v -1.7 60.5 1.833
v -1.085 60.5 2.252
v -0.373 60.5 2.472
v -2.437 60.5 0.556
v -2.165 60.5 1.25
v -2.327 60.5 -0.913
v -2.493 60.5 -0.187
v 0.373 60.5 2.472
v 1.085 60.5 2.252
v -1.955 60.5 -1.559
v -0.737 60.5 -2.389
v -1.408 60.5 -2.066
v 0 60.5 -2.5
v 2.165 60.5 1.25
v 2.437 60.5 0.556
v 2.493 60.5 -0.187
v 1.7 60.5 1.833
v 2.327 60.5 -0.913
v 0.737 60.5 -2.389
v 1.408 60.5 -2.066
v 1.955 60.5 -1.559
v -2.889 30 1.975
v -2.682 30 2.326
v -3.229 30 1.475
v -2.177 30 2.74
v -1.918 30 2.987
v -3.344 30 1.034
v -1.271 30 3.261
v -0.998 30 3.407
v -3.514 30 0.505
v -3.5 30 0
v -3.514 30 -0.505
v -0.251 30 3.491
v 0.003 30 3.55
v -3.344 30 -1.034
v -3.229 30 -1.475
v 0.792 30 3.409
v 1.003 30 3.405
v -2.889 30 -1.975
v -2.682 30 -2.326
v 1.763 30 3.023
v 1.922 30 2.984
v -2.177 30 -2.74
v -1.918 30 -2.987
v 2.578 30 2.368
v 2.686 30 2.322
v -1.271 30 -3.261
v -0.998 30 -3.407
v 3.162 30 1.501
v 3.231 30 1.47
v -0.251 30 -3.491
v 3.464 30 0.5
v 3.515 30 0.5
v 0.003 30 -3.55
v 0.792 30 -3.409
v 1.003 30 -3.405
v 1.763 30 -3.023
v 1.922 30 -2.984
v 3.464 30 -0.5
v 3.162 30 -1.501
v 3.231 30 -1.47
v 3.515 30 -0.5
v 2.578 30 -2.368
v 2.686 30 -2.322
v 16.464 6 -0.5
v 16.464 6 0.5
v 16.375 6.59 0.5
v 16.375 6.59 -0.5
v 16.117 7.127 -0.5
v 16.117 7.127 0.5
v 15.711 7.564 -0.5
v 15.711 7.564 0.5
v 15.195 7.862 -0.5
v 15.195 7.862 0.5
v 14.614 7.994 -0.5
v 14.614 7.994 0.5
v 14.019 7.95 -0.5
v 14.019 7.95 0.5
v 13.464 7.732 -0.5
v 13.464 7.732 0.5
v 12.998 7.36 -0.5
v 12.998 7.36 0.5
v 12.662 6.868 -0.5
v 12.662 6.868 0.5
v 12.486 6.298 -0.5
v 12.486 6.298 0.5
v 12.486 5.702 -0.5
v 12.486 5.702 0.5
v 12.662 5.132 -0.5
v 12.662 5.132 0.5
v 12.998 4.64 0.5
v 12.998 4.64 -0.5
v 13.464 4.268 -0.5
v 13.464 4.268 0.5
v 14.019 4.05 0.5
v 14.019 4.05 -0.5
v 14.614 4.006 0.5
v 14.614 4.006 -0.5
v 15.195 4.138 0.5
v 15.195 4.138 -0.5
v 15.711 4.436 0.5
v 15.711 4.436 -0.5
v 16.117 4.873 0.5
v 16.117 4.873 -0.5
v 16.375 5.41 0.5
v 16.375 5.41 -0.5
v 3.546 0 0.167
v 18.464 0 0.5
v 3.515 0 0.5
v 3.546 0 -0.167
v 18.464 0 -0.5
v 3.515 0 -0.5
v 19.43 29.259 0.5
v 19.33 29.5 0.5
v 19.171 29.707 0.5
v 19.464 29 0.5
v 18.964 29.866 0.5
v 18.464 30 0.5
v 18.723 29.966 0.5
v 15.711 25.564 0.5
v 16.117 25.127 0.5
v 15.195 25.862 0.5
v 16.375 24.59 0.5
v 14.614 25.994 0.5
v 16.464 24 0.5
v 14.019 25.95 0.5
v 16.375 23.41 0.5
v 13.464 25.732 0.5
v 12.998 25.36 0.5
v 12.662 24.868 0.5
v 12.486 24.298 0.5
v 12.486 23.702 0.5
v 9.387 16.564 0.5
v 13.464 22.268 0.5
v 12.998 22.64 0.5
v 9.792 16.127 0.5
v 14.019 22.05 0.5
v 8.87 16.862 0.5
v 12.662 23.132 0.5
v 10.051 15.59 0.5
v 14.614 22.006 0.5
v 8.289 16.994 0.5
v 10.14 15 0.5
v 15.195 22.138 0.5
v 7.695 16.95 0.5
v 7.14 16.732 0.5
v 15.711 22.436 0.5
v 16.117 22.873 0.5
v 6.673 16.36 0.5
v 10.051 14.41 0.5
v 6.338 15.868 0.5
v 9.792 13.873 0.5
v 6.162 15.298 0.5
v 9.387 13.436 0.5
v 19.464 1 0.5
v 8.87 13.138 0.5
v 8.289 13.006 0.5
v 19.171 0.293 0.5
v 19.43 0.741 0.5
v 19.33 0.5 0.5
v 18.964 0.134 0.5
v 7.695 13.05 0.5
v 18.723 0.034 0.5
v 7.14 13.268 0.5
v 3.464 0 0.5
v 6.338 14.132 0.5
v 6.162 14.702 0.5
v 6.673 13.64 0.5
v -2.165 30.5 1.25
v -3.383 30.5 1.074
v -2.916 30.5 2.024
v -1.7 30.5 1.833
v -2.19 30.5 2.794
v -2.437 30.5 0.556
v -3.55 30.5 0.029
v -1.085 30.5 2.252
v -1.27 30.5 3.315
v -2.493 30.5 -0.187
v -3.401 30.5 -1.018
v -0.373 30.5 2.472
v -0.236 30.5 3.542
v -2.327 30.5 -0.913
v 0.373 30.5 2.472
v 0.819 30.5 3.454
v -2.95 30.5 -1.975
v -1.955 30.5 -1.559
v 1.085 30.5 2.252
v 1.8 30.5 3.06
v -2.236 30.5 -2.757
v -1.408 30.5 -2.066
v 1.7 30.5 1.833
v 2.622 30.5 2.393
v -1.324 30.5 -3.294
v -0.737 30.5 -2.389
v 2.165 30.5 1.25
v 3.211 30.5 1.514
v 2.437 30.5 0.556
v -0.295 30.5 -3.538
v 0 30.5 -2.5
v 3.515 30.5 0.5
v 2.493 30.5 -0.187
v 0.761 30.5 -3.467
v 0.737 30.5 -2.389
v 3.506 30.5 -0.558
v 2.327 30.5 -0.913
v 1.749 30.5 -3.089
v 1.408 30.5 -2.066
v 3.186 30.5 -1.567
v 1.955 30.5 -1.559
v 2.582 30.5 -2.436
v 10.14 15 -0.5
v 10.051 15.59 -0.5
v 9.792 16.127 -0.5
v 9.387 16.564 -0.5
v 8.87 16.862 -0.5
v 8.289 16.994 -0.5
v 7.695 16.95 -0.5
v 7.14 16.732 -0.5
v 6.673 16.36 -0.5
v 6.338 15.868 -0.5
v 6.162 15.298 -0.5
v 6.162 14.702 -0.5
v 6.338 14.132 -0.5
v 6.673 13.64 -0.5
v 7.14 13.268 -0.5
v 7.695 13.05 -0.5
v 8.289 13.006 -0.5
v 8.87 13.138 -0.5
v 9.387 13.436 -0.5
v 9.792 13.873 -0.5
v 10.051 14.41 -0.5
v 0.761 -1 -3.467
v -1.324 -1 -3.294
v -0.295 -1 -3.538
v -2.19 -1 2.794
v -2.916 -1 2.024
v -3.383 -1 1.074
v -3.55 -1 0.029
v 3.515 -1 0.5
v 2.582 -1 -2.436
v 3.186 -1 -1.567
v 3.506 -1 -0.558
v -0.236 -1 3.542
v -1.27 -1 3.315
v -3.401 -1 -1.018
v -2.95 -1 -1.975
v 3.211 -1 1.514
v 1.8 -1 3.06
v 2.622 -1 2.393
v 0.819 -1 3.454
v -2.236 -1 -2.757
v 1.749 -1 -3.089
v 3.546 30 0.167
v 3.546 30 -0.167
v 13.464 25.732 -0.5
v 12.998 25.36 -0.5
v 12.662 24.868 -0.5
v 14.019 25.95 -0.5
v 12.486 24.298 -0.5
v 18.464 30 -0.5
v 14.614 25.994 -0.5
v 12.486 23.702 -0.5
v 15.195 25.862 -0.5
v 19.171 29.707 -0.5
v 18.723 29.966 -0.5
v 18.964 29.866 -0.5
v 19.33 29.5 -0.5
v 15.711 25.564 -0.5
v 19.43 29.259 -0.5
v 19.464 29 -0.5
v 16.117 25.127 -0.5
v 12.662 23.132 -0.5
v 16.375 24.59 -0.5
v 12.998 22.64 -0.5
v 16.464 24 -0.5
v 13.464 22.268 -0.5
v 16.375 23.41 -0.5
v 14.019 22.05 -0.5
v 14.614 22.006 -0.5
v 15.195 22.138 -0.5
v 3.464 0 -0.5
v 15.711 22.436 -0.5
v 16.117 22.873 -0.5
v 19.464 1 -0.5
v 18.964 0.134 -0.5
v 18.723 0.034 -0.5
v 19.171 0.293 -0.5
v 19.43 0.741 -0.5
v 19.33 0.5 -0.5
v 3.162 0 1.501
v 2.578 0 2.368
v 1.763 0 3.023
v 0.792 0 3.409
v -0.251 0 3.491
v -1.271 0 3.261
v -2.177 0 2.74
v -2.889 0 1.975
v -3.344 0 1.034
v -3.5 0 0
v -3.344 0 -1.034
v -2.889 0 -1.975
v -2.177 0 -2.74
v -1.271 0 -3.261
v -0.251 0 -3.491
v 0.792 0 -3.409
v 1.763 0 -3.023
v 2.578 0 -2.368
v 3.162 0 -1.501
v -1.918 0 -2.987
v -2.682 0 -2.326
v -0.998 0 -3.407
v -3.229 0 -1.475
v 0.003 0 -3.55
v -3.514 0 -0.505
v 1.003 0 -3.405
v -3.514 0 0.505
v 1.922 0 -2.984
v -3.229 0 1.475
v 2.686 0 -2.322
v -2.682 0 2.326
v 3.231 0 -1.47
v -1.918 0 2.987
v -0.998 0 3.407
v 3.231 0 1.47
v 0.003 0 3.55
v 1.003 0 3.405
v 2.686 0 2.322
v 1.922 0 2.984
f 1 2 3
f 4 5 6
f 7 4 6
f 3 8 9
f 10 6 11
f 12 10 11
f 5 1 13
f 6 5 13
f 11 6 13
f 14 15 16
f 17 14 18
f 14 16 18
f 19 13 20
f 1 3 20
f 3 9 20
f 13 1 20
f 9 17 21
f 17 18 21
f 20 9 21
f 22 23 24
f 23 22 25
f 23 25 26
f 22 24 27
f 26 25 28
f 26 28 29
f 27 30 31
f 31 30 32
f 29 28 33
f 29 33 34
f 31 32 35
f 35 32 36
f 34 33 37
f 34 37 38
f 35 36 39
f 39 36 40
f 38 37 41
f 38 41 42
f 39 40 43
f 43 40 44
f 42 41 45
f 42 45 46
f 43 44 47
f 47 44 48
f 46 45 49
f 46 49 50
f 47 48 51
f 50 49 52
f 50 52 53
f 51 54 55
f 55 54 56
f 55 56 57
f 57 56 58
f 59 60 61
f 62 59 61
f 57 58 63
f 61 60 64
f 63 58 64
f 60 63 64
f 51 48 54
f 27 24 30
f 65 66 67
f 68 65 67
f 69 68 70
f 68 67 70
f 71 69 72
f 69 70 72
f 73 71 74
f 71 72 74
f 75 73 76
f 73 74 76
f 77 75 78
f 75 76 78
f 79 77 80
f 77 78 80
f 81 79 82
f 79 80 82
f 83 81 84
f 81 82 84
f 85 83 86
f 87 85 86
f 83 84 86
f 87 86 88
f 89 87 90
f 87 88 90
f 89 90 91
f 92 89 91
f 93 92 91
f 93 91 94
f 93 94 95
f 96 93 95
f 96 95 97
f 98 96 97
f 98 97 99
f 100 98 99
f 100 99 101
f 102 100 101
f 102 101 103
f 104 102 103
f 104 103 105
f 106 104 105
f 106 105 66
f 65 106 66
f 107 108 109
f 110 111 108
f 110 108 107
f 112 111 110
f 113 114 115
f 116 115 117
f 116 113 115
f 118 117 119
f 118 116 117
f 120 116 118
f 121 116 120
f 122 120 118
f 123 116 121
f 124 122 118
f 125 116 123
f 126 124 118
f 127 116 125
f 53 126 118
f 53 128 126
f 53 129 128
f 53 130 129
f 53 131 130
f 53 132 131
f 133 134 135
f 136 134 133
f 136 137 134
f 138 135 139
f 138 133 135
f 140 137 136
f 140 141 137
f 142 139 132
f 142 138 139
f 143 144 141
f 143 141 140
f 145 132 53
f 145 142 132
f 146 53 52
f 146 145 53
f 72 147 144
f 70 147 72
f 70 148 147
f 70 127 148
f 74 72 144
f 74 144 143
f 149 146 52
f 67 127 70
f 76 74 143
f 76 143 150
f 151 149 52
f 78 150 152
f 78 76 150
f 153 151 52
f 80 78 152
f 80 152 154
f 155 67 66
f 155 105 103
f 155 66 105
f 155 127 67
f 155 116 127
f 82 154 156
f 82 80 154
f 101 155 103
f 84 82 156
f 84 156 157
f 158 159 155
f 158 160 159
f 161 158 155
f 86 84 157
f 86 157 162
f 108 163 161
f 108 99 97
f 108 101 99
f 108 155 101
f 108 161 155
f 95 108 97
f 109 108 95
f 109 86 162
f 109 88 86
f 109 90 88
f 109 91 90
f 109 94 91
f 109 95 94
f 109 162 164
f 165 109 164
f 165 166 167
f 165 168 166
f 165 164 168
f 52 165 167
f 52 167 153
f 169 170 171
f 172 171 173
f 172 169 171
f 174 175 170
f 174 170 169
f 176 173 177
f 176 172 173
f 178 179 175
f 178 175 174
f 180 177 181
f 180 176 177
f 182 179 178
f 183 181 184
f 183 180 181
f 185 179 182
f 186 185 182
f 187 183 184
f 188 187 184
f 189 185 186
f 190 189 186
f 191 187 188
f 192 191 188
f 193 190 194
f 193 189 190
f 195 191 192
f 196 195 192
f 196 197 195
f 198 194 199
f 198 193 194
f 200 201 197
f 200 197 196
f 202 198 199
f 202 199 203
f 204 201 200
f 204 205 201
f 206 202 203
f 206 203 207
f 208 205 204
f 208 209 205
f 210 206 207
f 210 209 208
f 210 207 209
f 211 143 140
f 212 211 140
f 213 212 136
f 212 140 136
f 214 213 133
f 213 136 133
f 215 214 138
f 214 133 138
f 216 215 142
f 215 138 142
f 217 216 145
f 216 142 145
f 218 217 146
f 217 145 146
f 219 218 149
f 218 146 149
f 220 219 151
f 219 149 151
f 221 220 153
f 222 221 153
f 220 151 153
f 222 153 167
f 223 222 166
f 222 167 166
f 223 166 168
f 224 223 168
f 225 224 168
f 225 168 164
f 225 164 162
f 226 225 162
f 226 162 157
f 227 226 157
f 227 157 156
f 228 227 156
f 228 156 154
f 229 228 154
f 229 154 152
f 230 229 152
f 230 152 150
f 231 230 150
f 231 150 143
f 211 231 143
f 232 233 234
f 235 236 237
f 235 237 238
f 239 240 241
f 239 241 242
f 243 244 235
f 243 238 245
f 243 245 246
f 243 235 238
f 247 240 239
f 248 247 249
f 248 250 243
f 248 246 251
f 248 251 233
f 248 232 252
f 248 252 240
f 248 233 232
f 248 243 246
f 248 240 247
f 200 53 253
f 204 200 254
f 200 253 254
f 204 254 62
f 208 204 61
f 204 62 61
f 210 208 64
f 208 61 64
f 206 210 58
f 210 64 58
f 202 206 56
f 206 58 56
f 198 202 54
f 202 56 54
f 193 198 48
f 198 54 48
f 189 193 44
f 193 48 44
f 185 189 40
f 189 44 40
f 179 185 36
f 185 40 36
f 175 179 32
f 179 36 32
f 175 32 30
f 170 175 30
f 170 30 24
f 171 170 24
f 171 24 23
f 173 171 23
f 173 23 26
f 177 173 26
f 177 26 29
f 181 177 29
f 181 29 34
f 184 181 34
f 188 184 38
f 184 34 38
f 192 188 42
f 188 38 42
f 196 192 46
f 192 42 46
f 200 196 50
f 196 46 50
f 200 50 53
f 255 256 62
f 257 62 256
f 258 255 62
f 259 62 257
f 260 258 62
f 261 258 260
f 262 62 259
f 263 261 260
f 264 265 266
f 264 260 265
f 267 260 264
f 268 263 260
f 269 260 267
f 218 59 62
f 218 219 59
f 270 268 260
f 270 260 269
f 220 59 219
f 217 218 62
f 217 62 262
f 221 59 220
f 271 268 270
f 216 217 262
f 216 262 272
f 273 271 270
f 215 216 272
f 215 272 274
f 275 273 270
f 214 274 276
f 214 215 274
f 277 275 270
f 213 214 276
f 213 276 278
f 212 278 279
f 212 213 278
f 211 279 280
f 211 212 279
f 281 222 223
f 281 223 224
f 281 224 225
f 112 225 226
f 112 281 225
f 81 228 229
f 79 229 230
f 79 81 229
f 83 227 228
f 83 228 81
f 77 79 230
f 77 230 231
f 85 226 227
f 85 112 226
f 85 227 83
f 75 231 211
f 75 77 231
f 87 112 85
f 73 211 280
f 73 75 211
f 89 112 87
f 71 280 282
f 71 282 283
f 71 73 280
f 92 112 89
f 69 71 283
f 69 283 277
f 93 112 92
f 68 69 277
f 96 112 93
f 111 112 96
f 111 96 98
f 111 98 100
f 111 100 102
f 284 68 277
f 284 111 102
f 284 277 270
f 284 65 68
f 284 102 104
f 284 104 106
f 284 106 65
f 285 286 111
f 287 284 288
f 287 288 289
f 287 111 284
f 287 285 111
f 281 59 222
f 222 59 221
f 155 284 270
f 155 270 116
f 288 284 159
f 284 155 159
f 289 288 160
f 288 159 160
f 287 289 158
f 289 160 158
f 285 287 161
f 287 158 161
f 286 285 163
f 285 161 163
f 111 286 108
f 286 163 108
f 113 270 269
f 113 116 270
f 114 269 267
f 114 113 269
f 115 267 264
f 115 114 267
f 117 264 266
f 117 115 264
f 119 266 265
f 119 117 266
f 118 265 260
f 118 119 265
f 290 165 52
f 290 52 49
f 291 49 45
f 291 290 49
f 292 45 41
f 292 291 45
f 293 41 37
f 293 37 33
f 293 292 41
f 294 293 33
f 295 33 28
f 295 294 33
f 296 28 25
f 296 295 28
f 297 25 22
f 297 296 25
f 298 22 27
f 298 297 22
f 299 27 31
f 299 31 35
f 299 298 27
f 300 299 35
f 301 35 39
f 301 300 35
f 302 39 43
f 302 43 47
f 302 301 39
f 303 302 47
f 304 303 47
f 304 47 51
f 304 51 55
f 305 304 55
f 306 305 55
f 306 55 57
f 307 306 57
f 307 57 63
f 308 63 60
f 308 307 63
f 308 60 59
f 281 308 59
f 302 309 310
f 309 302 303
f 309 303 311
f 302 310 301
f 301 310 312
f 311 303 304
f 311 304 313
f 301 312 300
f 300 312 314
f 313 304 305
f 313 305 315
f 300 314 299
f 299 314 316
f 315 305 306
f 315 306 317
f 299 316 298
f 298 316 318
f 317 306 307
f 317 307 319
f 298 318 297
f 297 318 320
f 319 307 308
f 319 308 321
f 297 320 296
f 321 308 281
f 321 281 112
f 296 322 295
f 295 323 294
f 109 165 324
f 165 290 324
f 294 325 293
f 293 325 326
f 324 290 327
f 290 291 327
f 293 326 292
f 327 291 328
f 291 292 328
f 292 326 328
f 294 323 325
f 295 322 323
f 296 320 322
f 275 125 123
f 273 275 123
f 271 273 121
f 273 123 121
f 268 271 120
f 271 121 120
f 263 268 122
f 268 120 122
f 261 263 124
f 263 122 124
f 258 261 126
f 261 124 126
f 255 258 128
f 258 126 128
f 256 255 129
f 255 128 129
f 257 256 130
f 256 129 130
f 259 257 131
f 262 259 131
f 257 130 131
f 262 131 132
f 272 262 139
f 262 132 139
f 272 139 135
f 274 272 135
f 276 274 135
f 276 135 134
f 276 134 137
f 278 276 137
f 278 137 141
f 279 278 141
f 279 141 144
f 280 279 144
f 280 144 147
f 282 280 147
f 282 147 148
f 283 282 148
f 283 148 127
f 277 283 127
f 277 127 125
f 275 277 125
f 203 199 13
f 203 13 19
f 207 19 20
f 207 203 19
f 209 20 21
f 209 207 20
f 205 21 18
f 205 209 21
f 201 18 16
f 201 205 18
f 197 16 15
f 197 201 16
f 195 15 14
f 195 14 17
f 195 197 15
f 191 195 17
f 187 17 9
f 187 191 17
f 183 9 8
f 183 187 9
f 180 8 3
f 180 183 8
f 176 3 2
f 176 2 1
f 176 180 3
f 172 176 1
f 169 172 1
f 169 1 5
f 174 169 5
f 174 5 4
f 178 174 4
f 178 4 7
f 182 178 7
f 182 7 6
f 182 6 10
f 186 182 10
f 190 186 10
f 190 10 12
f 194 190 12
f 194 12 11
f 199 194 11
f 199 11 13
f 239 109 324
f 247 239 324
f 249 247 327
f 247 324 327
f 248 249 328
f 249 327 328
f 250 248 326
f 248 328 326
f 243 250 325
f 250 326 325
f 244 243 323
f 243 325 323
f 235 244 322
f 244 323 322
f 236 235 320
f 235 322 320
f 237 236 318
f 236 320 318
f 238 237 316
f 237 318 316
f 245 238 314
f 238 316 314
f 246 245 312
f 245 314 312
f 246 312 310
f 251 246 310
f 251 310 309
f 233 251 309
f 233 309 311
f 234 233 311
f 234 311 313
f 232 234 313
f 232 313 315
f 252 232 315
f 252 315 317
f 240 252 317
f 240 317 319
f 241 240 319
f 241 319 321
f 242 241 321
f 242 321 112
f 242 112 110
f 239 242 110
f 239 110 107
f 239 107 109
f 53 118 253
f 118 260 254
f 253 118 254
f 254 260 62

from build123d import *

# Parameters (mm, degrees)
SKETCH_1_R          = 2.5
EXTRUDE_1_DEPTH     = 30
CUT_EXTRUDE_1_REACH = 37.984
SKETCH_2_R          = 2
FILLET_1_R          = 1
SKETCH_3_R          = 2.5
EXTRUDE_2_DEPTH     = 60.5
SKETCH_4_R          = 3.55
EXTRUDE_3_DEPTH     = 1
SKETCH_5_R          = 3.55
SKETCH_5_R_2        = 2.5
EXTRUDE_4_DEPTH     = 0.5


with BuildPart() as part:
    # 草图1 → 凸台-拉伸1 (new body)
    with BuildSketch(Plane(origin=(0, 0, 0), x_dir=(1, 0, 0), z_dir=(0, 1, 0))):
        with BuildLine():
            Line((19.464101615, -0.5), (3.464101615, -0.5))
            ThreePointArc((3.464101615, -0.5), (-3.5, 0), (3.464101615, 0.5))
            Line((3.464101615, 0.5), (19.464101615, 0.5))
            Line((19.464101615, 0.5), (19.464101615, -0.5))
        make_face()
        with Locations(Location((0, 0, 0), (0, 0, 270))):
            Circle(SKETCH_1_R, mode=Mode.SUBTRACT)
    extrude(amount=EXTRUDE_1_DEPTH)

    # 草图2 → 切除-拉伸1 (cut, up to next)
    with BuildSketch(Plane.XY.offset(0.5), mode=Mode.PRIVATE) as cut_extrude_1_sk1:
        with Locations((14.464101615, 24)):
            Circle(SKETCH_2_R)
    cut_extrude_1_tool1 = extrude(cut_extrude_1_sk1.sketch, amount=-CUT_EXTRUDE_1_REACH, mode=Mode.PRIVATE) & part.part
    # 草图2 → 切除-拉伸1 (cut, up to next)
    with BuildSketch(Plane.XY.offset(0.5), mode=Mode.PRIVATE) as cut_extrude_1_sk2:
        with Locations((8.139546295, 15)):
            Circle(SKETCH_2_R)
    cut_extrude_1_tool2 = extrude(cut_extrude_1_sk2.sketch, amount=-CUT_EXTRUDE_1_REACH, mode=Mode.PRIVATE) & part.part
    # 草图2 → 切除-拉伸1 (cut, up to next)
    with BuildSketch(Plane.XY.offset(0.5), mode=Mode.PRIVATE) as cut_extrude_1_sk3:
        with Locations((14.464101615, 6)):
            Circle(SKETCH_2_R)
    cut_extrude_1_tool3 = extrude(cut_extrude_1_sk3.sketch, amount=-CUT_EXTRUDE_1_REACH, mode=Mode.PRIVATE) & part.part
    add(cut_extrude_1_tool1.solids().sort_by_distance((14.464102, 24, 0.5))[0], mode=Mode.SUBTRACT)
    add(cut_extrude_1_tool2.solids().sort_by_distance((8.139546, 15, 0.5))[0], mode=Mode.SUBTRACT)
    add(cut_extrude_1_tool3.solids().sort_by_distance((14.464102, 6, 0.5))[0], mode=Mode.SUBTRACT)

    # 圆角1
    fillet_1_edges = [part.edges().sort_by_distance(p)[0] for p in [
        (19.464101615, 30, 0),
        (19.464101615, 0, 0),
    ]]
    fillet(fillet_1_edges, radius=FILLET_1_R)

    # 草图3 → 凸台-拉伸2 (add)
    with BuildSketch(Plane.XZ):
        with Locations(Location((0, 0, 0), (0, 0, 270))):
            Circle(SKETCH_3_R)
    extrude(amount=-EXTRUDE_2_DEPTH)

    # 草图4 → 凸台-拉伸3 (add)
    with BuildSketch(Plane.XZ):
        with Locations(Location((0, 0, 0), (0, 0, 8.09674977))):
            Circle(SKETCH_4_R)
    extrude(amount=EXTRUDE_3_DEPTH)

    # 草图5 → 凸台-拉伸4 (add)
    with BuildSketch(Plane(origin=(0, 30, 0), x_dir=(1, 0, 0), z_dir=(0, 1, 0))):
        with Locations(Location((0, 0, 0), (0, 0, 351.90325023))):
            Circle(SKETCH_5_R)
        with Locations(Location((0, 0, 0), (0, 0, 90))):
            Circle(SKETCH_5_R_2, mode=Mode.SUBTRACT)
    extrude(amount=EXTRUDE_4_DEPTH)


solid = part.part
